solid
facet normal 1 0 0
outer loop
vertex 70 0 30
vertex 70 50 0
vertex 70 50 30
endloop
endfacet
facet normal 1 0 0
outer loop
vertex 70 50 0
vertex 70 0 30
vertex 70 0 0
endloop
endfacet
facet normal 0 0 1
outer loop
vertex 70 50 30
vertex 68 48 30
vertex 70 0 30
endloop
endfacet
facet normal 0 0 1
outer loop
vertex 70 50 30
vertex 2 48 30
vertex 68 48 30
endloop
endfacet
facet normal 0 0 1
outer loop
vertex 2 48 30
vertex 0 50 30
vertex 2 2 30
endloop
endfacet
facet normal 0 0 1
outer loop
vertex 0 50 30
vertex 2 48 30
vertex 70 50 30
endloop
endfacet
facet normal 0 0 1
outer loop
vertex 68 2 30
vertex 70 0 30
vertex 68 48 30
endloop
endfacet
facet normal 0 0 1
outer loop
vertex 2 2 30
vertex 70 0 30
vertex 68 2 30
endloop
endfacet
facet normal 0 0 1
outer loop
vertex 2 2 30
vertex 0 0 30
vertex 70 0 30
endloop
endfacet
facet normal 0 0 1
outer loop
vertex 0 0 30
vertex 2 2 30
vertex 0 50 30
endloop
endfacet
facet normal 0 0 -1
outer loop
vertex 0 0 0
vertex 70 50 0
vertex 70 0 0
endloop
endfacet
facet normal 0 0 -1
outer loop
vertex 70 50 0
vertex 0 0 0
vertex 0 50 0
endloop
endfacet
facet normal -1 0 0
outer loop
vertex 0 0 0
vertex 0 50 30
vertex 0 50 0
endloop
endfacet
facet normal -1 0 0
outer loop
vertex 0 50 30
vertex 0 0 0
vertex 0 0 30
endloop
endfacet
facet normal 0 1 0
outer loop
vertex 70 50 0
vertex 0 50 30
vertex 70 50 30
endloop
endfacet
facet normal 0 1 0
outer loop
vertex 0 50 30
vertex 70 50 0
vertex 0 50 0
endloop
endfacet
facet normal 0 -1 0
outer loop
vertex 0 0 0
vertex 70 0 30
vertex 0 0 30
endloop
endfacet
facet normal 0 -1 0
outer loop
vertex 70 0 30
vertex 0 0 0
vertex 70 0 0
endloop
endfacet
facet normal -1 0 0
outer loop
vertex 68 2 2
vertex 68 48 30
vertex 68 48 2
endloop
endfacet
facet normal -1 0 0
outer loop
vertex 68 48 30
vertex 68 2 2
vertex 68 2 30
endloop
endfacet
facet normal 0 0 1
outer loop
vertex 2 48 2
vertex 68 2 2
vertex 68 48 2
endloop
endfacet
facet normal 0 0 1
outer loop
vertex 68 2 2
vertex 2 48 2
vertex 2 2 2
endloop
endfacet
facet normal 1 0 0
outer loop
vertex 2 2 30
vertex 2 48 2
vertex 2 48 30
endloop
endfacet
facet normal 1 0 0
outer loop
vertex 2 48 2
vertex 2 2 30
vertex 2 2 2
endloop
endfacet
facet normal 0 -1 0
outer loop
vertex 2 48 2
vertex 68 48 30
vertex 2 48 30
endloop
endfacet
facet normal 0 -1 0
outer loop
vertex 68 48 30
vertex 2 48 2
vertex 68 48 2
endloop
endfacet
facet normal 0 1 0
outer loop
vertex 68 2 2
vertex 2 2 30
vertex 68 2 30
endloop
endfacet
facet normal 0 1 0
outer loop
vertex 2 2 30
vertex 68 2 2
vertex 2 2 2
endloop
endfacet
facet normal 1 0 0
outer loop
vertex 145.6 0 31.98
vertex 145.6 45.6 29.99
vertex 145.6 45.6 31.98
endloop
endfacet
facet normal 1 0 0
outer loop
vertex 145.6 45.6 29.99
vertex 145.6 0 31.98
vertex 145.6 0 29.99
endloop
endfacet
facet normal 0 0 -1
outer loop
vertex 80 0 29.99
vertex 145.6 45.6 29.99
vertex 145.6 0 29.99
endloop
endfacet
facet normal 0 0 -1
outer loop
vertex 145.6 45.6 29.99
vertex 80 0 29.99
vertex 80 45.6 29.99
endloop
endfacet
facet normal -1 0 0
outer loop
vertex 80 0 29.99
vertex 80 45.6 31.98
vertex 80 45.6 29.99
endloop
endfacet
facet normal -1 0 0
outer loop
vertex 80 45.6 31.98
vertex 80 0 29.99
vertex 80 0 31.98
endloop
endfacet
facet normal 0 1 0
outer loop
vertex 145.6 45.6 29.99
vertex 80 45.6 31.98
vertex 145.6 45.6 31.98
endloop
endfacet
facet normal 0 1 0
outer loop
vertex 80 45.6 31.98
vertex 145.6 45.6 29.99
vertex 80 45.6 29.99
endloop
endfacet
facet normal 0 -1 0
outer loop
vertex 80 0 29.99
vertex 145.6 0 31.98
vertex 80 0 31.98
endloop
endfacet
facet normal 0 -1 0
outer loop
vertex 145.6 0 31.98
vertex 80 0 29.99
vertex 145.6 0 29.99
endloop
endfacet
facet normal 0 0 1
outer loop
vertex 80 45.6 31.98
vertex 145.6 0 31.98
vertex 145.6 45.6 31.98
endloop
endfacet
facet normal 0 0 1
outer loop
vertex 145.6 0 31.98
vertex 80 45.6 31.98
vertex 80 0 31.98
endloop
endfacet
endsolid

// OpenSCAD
// Two-part enclosure for small electronics board (e.g. Arduino-based logger)
// Print orientation: box standing on the bed, lid on top printed upside down

$fn = 64;

// ---- Box ----
box_x = 70;    // outer length (X)
box_y = 50;    // outer width (Y)
box_z = 30;    // outer height (Z)
box_wall = 2;  // wall thickness
box_floor = 2; // floor thickness

// ---- Lid ----
lip_x = 65.6;  // lip outer length (X)
lip_y = 45.6;  // lip outer width (Y)
lip_t = 1.5;   // lip thickness (Z)
lip_h = 4;     // lip height from plate top (Z)
plate_t = 2;   // plate thickness

// ---- Placement ----
gap = 10;      // gap between box and lid (X)

// Derived
box_inner_x = box_x - 2*box_wall;
box_inner_y = box_y - 2*box_wall;
lip_top_z = box_z + lip_h;   // for cutter to clear the lip top

module box() {
    difference() {
        cube([box_x, box_y, box_z]);
        // open-top cavity (extends past top face)
        translate([box_wall, box_wall, box_floor])
            cube([box_inner_x, box_inner_y, box_z - box_floor + 0.5]);
    }
}

module lid() {
    translate([box_x + gap, 0, 0])
        difference() {
            union() {
                // base plate
                cube([lip_x, lip_y, plate_t]);
                // lip on top of plate
                translate([0, 0, plate_t])
                    cube([lip_x, lip_y, lip_t]);
            }
            // cutter from above so the lip is hollow (no coplanar faces)
            translate([0, 0, plate_t - 0.01])
                cube([lip_x, lip_y, lip_h + 0.5]);
        }
}

module enclosure() {
    union() {
        box();
        // lid must be above the box so it doesn't intrude into the cavity
        translate([0, 0, box_z - 0.01])
            lid();
    }
}

enclosure();
